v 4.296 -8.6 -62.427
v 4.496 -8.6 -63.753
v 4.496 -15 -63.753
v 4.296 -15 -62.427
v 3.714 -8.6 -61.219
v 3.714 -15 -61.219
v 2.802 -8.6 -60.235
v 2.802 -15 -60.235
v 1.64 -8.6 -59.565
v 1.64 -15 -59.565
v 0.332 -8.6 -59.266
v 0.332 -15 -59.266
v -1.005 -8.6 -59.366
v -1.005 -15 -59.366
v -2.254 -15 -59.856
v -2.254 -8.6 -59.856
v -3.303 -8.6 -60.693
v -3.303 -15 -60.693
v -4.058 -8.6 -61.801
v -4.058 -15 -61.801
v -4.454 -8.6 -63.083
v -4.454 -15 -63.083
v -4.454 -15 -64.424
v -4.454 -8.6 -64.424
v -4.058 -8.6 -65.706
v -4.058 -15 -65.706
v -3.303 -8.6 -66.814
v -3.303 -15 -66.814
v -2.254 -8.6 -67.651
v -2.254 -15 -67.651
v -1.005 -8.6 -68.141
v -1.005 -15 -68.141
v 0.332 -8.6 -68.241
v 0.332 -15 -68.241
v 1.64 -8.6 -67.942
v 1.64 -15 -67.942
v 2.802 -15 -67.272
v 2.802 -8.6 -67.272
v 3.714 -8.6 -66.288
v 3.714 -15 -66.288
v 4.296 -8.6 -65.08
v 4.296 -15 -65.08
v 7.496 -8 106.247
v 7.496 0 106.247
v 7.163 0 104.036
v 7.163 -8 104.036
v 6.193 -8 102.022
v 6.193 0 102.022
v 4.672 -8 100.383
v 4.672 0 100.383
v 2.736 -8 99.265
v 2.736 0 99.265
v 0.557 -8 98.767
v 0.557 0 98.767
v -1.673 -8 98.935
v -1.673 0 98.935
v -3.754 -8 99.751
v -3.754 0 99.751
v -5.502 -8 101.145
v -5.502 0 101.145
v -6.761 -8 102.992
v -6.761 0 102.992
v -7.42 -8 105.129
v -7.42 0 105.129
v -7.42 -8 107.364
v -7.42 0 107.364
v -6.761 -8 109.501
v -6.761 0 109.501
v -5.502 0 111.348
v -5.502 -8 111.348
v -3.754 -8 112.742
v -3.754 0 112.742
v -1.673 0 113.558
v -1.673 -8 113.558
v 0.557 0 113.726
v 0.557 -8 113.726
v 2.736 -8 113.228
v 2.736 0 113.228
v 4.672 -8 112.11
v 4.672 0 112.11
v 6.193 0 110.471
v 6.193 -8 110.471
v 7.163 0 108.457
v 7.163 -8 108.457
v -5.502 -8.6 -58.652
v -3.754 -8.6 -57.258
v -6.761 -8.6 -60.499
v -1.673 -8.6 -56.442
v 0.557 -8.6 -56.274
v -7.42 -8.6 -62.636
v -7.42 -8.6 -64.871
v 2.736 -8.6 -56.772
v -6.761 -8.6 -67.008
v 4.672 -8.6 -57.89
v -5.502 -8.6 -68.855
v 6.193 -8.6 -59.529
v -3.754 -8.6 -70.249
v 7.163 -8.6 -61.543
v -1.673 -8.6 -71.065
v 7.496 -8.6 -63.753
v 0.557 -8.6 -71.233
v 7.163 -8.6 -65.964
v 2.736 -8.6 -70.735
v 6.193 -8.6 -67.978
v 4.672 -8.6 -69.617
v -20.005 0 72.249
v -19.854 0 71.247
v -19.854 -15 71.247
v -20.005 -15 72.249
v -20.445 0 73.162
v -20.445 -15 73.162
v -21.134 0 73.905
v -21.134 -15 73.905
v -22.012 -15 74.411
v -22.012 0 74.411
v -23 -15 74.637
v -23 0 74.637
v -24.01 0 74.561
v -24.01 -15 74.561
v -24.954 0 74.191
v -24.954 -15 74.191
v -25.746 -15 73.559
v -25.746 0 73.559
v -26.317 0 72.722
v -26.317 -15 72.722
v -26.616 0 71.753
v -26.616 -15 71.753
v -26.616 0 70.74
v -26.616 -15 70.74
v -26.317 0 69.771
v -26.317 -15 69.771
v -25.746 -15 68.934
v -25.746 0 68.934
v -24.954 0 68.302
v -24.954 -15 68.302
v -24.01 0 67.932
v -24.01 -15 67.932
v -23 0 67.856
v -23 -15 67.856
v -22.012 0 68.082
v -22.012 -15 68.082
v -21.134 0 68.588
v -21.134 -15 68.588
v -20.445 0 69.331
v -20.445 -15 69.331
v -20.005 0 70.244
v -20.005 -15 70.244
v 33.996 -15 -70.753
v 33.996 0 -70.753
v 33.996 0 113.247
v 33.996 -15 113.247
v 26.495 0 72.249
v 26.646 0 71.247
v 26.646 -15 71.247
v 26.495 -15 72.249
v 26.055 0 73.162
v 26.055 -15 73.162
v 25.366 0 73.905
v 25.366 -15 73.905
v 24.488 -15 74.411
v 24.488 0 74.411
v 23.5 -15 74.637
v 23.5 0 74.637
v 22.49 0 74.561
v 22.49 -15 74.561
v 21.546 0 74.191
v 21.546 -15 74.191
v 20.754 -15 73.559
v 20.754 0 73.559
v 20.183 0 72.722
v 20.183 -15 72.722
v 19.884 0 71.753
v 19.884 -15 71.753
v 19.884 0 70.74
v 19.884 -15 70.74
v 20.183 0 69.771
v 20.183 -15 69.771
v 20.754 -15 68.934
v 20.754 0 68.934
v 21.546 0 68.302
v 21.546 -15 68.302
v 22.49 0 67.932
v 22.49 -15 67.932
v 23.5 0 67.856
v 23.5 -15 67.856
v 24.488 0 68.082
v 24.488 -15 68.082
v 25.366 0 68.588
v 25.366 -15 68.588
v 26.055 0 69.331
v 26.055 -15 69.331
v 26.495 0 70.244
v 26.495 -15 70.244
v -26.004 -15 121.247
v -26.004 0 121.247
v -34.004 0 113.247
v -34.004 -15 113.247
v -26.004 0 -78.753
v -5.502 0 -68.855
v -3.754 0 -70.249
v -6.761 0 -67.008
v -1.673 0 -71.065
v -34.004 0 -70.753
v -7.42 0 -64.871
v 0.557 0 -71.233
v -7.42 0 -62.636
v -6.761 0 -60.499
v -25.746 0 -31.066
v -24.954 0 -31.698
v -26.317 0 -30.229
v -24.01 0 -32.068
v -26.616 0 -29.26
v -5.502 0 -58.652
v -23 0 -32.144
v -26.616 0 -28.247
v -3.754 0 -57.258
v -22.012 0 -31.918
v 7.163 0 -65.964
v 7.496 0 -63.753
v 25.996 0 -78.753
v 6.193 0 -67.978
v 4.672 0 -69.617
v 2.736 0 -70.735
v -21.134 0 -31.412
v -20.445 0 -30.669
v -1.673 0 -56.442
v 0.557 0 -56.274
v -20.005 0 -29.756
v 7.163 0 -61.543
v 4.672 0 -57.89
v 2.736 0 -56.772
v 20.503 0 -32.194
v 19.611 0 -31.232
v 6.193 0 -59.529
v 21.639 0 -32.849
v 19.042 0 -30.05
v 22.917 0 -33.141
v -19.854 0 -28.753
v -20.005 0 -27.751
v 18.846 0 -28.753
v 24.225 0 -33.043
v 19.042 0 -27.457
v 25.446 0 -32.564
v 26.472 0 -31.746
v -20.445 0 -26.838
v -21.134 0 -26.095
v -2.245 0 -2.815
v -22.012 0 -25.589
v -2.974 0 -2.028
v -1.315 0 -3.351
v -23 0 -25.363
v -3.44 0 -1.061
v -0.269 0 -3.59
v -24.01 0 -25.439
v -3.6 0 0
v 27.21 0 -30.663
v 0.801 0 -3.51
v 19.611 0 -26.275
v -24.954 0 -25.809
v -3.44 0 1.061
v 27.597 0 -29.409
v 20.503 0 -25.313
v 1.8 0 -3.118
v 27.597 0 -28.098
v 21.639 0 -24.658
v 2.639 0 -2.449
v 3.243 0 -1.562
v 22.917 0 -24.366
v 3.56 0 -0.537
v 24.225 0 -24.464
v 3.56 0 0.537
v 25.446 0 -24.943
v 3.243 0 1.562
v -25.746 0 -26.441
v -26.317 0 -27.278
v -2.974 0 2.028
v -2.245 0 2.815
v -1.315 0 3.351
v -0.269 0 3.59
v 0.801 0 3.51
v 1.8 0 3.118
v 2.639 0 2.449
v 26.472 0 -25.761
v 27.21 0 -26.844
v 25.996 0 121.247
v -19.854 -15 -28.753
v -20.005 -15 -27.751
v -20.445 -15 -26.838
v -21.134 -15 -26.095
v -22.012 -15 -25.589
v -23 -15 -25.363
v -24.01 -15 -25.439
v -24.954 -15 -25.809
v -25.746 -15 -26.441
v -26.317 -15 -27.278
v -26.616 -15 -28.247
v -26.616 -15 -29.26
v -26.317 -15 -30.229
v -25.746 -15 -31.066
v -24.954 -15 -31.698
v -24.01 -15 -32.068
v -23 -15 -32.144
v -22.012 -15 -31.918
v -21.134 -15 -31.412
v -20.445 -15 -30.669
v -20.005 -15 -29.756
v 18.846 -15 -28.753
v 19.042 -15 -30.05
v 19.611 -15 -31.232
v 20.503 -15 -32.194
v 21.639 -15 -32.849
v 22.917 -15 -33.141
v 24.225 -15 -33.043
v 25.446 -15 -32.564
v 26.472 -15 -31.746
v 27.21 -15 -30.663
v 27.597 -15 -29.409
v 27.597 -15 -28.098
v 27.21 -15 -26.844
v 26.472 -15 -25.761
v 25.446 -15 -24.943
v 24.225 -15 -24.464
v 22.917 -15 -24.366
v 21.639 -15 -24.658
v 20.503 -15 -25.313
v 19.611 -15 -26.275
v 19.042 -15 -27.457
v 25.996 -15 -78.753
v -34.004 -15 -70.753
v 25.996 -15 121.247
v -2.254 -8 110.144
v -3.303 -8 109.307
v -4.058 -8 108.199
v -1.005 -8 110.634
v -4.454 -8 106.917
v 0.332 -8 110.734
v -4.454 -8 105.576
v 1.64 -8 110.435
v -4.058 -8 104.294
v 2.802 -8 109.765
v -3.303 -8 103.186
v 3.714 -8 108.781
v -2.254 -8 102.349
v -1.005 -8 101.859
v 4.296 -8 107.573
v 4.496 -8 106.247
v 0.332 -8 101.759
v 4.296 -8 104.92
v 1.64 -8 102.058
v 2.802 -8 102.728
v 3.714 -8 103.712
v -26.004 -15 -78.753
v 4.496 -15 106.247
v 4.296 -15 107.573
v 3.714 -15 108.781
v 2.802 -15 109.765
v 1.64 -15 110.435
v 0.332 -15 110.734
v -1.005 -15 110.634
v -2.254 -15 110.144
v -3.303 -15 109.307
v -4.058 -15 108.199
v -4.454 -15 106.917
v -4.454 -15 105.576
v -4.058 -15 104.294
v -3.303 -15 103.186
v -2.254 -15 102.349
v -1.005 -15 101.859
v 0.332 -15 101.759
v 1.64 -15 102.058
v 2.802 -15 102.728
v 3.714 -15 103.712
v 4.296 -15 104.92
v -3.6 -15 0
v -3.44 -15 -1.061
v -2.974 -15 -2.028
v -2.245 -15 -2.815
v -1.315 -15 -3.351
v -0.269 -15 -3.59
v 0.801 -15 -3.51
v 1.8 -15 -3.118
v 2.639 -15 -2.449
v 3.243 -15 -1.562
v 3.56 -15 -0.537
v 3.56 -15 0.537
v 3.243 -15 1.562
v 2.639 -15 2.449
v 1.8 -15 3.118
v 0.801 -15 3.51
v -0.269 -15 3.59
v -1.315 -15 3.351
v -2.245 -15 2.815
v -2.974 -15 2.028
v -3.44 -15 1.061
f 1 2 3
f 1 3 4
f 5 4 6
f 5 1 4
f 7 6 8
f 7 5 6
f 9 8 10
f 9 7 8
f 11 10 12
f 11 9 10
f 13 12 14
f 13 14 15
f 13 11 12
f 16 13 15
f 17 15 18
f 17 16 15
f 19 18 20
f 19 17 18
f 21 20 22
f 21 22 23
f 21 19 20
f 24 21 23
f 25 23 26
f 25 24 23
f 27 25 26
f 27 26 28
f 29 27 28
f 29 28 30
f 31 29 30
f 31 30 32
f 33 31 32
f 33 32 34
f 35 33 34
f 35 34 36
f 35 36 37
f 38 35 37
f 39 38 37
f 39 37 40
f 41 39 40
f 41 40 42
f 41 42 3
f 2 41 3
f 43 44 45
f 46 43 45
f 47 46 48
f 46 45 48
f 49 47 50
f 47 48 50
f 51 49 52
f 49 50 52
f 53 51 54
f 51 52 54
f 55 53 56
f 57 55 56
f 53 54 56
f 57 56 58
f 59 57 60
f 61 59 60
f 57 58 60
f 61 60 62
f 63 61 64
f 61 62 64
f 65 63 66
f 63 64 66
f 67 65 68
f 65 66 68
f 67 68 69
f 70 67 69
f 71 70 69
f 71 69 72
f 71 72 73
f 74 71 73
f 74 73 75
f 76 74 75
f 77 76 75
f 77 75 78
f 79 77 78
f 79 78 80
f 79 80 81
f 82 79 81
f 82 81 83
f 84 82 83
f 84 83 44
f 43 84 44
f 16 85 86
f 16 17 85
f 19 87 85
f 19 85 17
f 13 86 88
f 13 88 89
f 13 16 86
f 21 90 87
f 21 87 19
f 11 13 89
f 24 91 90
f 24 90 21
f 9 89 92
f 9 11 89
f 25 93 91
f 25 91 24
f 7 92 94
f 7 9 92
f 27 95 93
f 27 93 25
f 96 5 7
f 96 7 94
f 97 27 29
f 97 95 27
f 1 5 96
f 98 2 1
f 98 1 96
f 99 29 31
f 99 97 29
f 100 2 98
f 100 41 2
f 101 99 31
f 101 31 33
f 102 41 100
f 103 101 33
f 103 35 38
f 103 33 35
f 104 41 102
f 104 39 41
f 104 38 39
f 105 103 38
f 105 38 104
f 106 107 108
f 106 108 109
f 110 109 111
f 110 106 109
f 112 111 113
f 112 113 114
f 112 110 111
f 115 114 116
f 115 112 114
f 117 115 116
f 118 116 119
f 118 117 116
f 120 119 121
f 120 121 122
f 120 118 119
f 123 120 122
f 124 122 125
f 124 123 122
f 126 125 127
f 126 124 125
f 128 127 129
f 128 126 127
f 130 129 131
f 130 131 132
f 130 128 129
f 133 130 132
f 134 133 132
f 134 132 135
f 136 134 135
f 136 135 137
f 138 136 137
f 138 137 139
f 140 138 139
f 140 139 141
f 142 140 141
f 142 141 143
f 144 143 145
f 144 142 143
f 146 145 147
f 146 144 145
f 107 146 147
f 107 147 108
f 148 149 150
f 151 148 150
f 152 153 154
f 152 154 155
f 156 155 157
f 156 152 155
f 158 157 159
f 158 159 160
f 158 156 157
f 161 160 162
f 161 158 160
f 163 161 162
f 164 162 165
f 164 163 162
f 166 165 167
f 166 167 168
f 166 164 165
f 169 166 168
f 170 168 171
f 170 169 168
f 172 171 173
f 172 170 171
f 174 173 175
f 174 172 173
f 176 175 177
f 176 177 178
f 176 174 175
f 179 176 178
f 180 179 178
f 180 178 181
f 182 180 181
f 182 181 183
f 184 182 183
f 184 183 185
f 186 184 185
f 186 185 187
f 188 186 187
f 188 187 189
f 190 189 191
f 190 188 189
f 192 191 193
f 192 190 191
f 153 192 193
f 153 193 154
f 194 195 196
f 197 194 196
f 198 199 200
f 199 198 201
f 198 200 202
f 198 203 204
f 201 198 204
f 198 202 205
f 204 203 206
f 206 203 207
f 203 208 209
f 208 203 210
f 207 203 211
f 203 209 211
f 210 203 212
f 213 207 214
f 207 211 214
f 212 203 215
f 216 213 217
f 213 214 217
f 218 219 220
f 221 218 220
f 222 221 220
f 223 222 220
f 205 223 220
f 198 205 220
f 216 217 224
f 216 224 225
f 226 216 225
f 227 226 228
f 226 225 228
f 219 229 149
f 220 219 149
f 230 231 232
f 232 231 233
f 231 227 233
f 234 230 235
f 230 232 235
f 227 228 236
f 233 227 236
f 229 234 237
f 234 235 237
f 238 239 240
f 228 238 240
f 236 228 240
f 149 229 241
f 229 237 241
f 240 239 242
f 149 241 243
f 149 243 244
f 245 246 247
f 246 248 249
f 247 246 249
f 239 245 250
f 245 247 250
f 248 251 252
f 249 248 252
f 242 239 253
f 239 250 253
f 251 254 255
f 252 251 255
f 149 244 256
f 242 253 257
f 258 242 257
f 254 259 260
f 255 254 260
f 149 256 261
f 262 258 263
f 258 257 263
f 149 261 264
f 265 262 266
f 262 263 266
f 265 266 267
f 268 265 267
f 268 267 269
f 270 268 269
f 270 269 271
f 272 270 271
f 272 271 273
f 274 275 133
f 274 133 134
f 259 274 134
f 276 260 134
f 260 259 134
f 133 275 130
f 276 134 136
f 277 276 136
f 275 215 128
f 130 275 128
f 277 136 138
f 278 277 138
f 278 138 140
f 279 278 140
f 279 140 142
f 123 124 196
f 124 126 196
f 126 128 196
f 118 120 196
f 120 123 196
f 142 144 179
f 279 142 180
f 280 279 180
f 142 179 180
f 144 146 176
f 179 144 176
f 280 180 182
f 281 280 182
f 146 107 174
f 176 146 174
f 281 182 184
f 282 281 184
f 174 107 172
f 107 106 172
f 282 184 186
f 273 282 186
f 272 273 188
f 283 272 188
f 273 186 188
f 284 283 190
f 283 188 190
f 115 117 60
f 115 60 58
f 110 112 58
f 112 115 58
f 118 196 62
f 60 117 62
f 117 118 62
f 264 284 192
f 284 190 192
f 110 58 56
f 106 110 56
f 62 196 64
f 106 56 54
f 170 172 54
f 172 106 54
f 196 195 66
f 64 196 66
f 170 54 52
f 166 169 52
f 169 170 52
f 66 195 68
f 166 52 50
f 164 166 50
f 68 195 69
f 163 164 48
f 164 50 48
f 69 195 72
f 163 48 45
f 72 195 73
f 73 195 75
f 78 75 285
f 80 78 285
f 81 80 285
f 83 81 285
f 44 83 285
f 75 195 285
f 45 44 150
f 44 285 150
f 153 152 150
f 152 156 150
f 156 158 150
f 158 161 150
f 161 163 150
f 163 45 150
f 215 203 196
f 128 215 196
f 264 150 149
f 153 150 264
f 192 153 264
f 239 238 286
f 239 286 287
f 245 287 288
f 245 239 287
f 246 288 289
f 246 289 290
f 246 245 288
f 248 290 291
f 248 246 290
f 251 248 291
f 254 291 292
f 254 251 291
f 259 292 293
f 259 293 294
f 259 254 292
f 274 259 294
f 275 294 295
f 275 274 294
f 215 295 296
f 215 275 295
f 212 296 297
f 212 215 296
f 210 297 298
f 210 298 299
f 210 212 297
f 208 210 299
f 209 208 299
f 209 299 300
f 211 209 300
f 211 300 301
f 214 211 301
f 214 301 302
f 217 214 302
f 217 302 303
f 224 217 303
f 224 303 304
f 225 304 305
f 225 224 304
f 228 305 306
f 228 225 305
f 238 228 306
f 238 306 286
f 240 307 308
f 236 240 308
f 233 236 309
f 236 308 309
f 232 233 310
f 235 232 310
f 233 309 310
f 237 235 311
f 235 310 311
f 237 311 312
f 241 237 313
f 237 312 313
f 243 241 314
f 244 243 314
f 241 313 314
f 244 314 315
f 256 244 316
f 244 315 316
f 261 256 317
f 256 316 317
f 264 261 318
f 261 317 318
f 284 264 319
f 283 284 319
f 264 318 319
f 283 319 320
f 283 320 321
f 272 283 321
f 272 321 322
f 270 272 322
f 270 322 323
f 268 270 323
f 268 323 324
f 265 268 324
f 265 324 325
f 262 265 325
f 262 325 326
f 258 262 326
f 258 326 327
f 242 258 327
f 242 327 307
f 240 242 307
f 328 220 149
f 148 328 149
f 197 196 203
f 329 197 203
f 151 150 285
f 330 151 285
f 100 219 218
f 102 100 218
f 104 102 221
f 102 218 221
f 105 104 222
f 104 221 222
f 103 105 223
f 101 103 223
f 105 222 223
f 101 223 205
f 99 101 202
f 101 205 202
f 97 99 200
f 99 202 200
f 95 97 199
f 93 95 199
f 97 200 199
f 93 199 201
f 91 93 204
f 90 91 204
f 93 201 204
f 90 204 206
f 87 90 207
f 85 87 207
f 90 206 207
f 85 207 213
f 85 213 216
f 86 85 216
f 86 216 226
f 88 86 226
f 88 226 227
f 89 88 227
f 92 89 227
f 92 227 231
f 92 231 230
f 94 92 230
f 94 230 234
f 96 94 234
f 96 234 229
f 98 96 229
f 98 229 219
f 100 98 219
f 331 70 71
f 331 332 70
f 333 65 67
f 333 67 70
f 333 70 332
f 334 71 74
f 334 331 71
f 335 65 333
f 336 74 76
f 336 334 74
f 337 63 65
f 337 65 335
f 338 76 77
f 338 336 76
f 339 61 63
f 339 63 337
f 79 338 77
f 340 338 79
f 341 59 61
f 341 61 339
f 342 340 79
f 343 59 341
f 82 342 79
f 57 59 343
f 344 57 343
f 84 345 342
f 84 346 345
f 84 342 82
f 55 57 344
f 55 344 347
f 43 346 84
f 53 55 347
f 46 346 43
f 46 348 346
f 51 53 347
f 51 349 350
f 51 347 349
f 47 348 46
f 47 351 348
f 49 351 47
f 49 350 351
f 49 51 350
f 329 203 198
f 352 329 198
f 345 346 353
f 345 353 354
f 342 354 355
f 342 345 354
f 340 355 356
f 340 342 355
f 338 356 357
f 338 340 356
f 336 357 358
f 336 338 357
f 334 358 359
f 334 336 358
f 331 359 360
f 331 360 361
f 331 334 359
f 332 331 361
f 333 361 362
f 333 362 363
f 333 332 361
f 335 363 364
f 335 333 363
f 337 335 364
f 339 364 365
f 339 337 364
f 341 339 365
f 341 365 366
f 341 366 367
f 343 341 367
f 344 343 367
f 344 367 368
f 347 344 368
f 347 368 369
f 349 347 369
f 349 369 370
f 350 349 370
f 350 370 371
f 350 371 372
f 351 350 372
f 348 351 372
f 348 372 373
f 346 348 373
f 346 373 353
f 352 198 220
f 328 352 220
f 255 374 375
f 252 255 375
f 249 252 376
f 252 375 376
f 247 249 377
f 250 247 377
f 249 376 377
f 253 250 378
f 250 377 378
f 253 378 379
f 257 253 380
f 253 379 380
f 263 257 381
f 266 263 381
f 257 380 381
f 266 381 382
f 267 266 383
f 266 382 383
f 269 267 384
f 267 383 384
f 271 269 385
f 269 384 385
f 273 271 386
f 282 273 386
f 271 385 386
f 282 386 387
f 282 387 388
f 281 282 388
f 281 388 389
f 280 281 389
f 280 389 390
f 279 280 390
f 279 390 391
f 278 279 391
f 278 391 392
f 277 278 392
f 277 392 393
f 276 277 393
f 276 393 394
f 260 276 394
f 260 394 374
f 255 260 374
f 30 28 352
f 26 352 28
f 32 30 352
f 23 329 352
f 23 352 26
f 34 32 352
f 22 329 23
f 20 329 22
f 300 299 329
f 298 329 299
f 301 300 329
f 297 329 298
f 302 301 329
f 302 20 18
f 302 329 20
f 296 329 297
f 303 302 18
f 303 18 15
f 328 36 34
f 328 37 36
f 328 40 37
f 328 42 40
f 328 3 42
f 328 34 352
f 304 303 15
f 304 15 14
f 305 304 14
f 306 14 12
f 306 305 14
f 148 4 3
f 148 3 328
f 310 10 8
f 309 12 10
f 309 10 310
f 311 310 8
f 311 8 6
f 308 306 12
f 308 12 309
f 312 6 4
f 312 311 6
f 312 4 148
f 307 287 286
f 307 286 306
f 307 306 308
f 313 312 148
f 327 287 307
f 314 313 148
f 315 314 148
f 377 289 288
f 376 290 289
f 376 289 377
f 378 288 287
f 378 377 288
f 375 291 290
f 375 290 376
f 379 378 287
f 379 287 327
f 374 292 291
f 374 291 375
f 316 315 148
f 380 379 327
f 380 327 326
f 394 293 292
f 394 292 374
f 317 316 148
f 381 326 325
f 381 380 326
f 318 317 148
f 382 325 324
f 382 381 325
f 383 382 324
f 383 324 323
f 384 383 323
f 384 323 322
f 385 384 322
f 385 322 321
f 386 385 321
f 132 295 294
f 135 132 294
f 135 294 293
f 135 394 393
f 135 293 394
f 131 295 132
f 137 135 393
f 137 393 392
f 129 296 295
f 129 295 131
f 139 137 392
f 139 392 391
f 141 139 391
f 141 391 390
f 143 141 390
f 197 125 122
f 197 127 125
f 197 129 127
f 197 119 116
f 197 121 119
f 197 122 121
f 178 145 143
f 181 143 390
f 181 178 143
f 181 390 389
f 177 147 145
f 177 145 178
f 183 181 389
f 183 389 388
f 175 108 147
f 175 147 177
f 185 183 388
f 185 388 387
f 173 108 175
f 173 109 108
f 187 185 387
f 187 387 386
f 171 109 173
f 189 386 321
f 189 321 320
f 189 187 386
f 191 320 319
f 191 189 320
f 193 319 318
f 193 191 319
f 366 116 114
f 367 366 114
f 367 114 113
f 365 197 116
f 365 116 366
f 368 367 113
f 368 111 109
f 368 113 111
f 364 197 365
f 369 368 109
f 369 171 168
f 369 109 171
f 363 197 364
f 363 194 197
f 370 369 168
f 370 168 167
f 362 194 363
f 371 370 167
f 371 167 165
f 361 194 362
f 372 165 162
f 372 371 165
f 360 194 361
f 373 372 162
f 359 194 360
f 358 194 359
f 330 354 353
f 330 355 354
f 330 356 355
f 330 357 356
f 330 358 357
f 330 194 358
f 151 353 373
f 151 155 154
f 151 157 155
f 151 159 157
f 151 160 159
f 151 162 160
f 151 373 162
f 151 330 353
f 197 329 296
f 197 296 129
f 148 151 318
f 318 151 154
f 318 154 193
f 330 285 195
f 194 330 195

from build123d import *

# Parameters (mm, degrees)
F0_R           = 3.3999999346
F0_R_2         = 4.4999999135
F1_DEPTH       = 15
F2_D           = 8.8
F2_CBORE_D     = 15
F2_CBORE_DEPTH = 8
F3_D           = 8.8
F3_CBORE_D     = 15
F3_CBORE_DEPTH = 8.6
F4_D           = 8.8
F5_D           = 7.2


with BuildPart() as f1:
    # F0 (on Front) → F1 (new body)
    with BuildSketch(Plane.XZ):
        Polygon((25.9961503957, 121.2465122815), (-26.0038496043, 121.2465122815), (-34.0038514504, 113.2465114353), (-34.0038514504, -70.7534860262), (-26.0038496043, -78.7534868724), (25.9961503957, -78.7534868724), (33.9961512419, -70.7534860262), (33.9961512419, 113.2465114353), align=None)
        with Locations((-23.2538496572, -28.7534868339)):
            Circle(F0_R, mode=Mode.SUBTRACT)
        with Locations((-0.0038501043, -63.7534861608)):
            Circle(F0_R_2, mode=Mode.SUBTRACT)
        with Locations((23.2461494486, -28.7534868339)):
            Circle(F0_R, mode=Mode.SUBTRACT)
        with Locations((-23.2538496572, 71.246511243)):
            Circle(F0_R, mode=Mode.SUBTRACT)
        with Locations((23.2461494486, 71.246511243)):
            Circle(F0_R, mode=Mode.SUBTRACT)
        with Locations((-0.0038501043, 106.2465105699)):
            Circle(F0_R_2, mode=Mode.SUBTRACT)
    extrude(amount=F1_DEPTH)

    # F2 (through all)
    with Locations(Plane(origin=(0, 0, 0), x_dir=(1, 0, 0), z_dir=(0, 1, 0))):
        with Locations((-0.0038501043, -106.2465105699)):
            CounterBoreHole(F2_D / 2, F2_CBORE_D / 2, F2_CBORE_DEPTH)

    # F3 (through all)
    with Locations(Plane(origin=(0, 0, 0), x_dir=(1, 0, 0), z_dir=(0, 1, 0))):
        with Locations((-0.0038501043, 63.7534861608)):
            CounterBoreHole(F3_D / 2, F3_CBORE_D / 2, F3_CBORE_DEPTH)

    # F4 (through all)
    with Locations(Plane(origin=(0, 0, 0), x_dir=(1, 0, 0), z_dir=(0, 1, 0))):
        with Locations((23.2461494486, 28.7534868339)):
            Hole(F4_D / 2)

    # F5 (through all)
    with Locations(Plane(origin=(0, 0, 0), x_dir=(1, 0, 0), z_dir=(0, 1, 0))):
        with Locations((0, 0)):
            Hole(F5_D / 2)


solid = f1.part
